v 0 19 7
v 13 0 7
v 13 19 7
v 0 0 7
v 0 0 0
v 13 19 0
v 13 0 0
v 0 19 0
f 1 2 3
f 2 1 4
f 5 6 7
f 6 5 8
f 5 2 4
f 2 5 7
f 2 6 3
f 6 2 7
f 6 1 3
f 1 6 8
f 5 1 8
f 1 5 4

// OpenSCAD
// Generated by SolidPython 1.0.1 on 2020-07-29 00:46:55


cube(size = [13, 19, 7]);
/***********************************************
*********      SolidPython code:      **********
************************************************
 
# import packages: SolidPython
from solid import *
from solid.utils import *
from itertools import chain, combinations, permutations


class Resize:

    def __init__(self, scad_file):
        self.scad_file = scad_file
        #self.scad_file = import_scad(scad_file)
        # cone/cylinder param:
        self.r1 = 0
        self.r2 = 0
        self.h = 0
        # rectangular prism param:
        self.w = 0
        self.l = 0
        # ellipse param:
        self.r = 0

    # import OpenScad code (file name corresponds to shape)


    # classify shape + parameters
    def assign(self, param1, param2, param3):
        if self.scad_file == 'cone.scad':
            self.r1 = param1
            self.r2 = param2
            self.h = param3
        elif self.scad_file == 'cylinder.scad':
            self.r1 = param1
            self.r2 = param2
            self.h = param3
        elif self.scad_file == 'rectangularPrism.scad':
            self.h = param1
            self.l = param2
            self.w = param3
        else:
            self.r = param1
            self.h = param2

    # resize parameters
    def iterate(self):
        x = range(3, 20, 2)
        i = 1
        if self.scad_file == 'cone.scad':
            tempList = list(permutations(x, 2))
            for temp in tempList:
                param1 = temp[0]
                param2 = temp[1]
                filepath = 'produced_scad_files/' + 'cone' + str(param1) + '_' + str(param2) + '_' + '.scad'
                scad_render_to_file(cylinder(h=param1, r1=param2, r2=0), filepath)

        elif self.scad_file == 'cylinder.scad':
            tempList = list(permutations(x, 3))
            for temp in tempList:
                param1 = temp[0]
                param2 = temp[1]
                filepath = 'produced_scad_files/' + 'cylinder' + str(param1) + '_' + str(param2) + '_' + '.scad'
                scad_render_to_file(cylinder(h=param1, r1=param2, r2=param2), filepath)

        elif self.scad_file == 'rectangularPrism.scad':
            tempList = list(permutations(x, 3))
            for temp in tempList:
                param1 = temp[0]
                param2 = temp[1]
                param3 = temp[2]
                filepath = 'produced_scad_files/' + 'rectangularPrism' + str(param1) + '_' + str(param2) + '_' + str(
                    param3) + '.scad'
                scad_render_to_file(cube(size=(param1, param2, param3)), filepath)

        elif self.scad_file == 'ellipse.scad':
            tempList = list(permutations(x, 4))
            for temp in tempList:
                param1 = temp[0]
                param2 = temp[1]
                param3 = temp[2]
                param4 = temp[3]
                filepath = 'produced_scad_files/' + 'ellipse' + str(param1) + '_' + str(param2) + '_' + str(param3) + '_' + str(param4) + '.scad'
                scad_render_to_file(scale([param1, param2, param3])(sphere(r=param4)), filepath)

    def render_to_scadfile(self):
        scad_render_to_file(scad, 'example.scad') 
 
************************************************/
